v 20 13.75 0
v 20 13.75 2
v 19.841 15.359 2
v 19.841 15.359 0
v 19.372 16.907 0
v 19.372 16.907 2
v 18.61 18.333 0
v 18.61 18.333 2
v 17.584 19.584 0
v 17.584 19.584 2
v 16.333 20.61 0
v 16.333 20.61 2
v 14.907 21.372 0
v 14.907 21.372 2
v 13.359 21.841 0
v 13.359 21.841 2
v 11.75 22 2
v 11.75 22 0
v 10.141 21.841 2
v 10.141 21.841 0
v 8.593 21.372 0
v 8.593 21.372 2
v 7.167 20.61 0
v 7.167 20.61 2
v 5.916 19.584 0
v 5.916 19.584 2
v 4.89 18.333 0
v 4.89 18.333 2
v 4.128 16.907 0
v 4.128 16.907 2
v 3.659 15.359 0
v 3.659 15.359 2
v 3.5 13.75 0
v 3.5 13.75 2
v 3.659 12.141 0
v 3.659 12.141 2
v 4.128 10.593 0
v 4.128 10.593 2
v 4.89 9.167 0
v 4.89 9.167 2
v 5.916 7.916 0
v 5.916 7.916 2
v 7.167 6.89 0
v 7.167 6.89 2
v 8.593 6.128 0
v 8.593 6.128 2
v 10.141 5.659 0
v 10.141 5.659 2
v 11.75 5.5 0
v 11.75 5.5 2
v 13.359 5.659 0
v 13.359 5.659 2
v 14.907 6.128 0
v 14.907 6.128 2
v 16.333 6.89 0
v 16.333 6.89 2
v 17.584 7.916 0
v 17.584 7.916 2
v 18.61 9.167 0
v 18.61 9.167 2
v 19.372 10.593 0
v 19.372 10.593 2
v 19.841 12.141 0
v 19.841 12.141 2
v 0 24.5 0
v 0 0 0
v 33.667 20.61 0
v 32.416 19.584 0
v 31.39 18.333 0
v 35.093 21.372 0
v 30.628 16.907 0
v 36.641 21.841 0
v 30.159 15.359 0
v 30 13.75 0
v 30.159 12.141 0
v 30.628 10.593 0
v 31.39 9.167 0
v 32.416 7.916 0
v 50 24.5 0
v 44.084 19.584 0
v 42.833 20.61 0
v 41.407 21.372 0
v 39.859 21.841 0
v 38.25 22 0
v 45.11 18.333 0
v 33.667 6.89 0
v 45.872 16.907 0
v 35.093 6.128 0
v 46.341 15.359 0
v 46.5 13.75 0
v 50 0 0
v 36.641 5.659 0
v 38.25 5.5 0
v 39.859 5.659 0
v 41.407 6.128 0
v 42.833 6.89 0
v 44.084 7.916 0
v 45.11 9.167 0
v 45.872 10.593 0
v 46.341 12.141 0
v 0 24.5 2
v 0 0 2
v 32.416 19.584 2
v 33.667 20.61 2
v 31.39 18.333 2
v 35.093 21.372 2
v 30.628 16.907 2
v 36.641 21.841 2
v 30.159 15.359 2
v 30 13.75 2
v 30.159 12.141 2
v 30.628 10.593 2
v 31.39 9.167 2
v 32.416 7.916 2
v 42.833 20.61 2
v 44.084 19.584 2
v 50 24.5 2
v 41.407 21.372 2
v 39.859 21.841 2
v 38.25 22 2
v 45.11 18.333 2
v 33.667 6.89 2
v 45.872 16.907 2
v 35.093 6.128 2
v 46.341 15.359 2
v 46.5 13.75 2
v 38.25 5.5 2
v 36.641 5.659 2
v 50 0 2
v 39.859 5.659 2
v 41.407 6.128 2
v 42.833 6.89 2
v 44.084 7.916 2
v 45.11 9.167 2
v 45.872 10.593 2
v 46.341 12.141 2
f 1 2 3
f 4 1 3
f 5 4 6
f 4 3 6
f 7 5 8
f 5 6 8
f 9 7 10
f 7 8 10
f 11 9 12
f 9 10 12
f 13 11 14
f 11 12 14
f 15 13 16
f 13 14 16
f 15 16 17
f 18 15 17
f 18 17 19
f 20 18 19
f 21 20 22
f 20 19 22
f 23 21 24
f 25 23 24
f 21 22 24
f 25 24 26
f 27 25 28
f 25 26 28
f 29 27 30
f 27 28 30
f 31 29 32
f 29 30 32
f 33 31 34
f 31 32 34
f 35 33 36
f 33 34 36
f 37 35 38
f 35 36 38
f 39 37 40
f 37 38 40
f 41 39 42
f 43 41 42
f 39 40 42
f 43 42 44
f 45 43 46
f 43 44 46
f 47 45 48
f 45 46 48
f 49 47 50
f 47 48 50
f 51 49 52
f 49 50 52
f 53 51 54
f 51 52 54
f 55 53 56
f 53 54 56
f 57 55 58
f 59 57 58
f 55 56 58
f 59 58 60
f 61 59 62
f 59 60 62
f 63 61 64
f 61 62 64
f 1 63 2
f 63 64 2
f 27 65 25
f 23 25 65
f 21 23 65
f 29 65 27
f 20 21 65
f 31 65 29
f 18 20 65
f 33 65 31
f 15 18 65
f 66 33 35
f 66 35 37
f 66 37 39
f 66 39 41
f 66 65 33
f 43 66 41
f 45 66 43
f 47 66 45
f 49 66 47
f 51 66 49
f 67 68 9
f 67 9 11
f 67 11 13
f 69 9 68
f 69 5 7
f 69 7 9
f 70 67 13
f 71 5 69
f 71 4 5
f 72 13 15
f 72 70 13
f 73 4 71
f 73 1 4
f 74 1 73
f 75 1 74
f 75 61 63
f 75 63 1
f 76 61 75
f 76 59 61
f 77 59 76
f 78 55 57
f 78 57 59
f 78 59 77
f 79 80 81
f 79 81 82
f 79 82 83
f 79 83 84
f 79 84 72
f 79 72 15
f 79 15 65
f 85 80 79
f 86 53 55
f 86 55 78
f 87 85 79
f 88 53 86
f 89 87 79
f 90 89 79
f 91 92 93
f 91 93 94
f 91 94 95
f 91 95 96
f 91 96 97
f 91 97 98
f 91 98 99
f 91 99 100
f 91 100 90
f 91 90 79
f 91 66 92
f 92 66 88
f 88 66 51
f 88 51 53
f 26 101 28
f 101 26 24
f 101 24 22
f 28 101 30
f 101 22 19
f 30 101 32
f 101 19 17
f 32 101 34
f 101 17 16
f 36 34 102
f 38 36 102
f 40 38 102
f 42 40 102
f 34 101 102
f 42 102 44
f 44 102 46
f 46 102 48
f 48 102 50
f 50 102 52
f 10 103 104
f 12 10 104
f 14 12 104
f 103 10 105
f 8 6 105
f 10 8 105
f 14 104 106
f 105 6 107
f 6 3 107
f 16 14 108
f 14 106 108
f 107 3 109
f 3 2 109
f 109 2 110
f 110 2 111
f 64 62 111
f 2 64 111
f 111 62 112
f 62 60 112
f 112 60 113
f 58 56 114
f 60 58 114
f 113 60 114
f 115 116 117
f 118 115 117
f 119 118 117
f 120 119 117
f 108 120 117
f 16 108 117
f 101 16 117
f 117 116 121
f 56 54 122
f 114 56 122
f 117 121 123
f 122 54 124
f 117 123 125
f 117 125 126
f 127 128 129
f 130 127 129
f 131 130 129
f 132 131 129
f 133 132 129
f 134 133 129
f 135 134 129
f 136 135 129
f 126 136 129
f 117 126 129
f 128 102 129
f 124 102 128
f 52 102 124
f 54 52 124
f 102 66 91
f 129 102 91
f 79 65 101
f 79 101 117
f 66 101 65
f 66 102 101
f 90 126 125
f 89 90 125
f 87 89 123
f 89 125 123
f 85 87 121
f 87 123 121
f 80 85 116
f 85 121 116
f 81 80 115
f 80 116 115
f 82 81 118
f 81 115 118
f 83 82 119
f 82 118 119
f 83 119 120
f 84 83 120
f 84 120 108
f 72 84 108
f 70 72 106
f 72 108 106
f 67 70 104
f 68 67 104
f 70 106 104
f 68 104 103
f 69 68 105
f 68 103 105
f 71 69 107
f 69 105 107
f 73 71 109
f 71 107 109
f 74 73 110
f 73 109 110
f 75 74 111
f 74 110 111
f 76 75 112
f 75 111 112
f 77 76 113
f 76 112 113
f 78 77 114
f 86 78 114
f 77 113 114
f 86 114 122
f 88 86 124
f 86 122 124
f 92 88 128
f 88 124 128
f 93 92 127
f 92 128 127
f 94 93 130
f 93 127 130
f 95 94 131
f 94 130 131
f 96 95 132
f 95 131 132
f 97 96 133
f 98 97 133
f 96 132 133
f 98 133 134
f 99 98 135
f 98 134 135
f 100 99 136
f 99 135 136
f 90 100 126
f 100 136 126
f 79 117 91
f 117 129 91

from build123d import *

# Parameters (mm, degrees)
SKETCH1_W           = 50
SKETCH1_H           = 22.5
BOSS_EXTRUDE1_DEPTH = 2
SKETCH2_R           = 8.25
CUT_EXTRUDE1_DEPTH  = 2
SKETCH3_W           = 50
SKETCH3_H           = 2
BOSS_EXTRUDE2_DEPTH = 2


with BuildPart() as part:
    # Sketch1 → Boss-Extrude1 (new body)
    with BuildSketch(Plane.XY):
        with Locations((25, 11.25)):
            Rectangle(SKETCH1_W, SKETCH1_H)
    extrude(amount=BOSS_EXTRUDE1_DEPTH)

    # Sketch2 → Cut-Extrude1 (cut)
    with BuildSketch(Plane.XY.offset(2)):
        with Locations((11.75, 13.75)):
            Circle(SKETCH2_R)
        with Locations((38.25, 13.75)):
            Circle(SKETCH2_R)
    extrude(amount=-CUT_EXTRUDE1_DEPTH, mode=Mode.SUBTRACT)

    # Sketch3 → Boss-Extrude2 (add)
    with BuildSketch(Plane(origin=(0, 22.5, 0), x_dir=(1, 0, 0), z_dir=(0, 1, 0))):
        with Locations((25, -1)):
            Rectangle(SKETCH3_W, SKETCH3_H)
    extrude(amount=BOSS_EXTRUDE2_DEPTH)


solid = part.part
